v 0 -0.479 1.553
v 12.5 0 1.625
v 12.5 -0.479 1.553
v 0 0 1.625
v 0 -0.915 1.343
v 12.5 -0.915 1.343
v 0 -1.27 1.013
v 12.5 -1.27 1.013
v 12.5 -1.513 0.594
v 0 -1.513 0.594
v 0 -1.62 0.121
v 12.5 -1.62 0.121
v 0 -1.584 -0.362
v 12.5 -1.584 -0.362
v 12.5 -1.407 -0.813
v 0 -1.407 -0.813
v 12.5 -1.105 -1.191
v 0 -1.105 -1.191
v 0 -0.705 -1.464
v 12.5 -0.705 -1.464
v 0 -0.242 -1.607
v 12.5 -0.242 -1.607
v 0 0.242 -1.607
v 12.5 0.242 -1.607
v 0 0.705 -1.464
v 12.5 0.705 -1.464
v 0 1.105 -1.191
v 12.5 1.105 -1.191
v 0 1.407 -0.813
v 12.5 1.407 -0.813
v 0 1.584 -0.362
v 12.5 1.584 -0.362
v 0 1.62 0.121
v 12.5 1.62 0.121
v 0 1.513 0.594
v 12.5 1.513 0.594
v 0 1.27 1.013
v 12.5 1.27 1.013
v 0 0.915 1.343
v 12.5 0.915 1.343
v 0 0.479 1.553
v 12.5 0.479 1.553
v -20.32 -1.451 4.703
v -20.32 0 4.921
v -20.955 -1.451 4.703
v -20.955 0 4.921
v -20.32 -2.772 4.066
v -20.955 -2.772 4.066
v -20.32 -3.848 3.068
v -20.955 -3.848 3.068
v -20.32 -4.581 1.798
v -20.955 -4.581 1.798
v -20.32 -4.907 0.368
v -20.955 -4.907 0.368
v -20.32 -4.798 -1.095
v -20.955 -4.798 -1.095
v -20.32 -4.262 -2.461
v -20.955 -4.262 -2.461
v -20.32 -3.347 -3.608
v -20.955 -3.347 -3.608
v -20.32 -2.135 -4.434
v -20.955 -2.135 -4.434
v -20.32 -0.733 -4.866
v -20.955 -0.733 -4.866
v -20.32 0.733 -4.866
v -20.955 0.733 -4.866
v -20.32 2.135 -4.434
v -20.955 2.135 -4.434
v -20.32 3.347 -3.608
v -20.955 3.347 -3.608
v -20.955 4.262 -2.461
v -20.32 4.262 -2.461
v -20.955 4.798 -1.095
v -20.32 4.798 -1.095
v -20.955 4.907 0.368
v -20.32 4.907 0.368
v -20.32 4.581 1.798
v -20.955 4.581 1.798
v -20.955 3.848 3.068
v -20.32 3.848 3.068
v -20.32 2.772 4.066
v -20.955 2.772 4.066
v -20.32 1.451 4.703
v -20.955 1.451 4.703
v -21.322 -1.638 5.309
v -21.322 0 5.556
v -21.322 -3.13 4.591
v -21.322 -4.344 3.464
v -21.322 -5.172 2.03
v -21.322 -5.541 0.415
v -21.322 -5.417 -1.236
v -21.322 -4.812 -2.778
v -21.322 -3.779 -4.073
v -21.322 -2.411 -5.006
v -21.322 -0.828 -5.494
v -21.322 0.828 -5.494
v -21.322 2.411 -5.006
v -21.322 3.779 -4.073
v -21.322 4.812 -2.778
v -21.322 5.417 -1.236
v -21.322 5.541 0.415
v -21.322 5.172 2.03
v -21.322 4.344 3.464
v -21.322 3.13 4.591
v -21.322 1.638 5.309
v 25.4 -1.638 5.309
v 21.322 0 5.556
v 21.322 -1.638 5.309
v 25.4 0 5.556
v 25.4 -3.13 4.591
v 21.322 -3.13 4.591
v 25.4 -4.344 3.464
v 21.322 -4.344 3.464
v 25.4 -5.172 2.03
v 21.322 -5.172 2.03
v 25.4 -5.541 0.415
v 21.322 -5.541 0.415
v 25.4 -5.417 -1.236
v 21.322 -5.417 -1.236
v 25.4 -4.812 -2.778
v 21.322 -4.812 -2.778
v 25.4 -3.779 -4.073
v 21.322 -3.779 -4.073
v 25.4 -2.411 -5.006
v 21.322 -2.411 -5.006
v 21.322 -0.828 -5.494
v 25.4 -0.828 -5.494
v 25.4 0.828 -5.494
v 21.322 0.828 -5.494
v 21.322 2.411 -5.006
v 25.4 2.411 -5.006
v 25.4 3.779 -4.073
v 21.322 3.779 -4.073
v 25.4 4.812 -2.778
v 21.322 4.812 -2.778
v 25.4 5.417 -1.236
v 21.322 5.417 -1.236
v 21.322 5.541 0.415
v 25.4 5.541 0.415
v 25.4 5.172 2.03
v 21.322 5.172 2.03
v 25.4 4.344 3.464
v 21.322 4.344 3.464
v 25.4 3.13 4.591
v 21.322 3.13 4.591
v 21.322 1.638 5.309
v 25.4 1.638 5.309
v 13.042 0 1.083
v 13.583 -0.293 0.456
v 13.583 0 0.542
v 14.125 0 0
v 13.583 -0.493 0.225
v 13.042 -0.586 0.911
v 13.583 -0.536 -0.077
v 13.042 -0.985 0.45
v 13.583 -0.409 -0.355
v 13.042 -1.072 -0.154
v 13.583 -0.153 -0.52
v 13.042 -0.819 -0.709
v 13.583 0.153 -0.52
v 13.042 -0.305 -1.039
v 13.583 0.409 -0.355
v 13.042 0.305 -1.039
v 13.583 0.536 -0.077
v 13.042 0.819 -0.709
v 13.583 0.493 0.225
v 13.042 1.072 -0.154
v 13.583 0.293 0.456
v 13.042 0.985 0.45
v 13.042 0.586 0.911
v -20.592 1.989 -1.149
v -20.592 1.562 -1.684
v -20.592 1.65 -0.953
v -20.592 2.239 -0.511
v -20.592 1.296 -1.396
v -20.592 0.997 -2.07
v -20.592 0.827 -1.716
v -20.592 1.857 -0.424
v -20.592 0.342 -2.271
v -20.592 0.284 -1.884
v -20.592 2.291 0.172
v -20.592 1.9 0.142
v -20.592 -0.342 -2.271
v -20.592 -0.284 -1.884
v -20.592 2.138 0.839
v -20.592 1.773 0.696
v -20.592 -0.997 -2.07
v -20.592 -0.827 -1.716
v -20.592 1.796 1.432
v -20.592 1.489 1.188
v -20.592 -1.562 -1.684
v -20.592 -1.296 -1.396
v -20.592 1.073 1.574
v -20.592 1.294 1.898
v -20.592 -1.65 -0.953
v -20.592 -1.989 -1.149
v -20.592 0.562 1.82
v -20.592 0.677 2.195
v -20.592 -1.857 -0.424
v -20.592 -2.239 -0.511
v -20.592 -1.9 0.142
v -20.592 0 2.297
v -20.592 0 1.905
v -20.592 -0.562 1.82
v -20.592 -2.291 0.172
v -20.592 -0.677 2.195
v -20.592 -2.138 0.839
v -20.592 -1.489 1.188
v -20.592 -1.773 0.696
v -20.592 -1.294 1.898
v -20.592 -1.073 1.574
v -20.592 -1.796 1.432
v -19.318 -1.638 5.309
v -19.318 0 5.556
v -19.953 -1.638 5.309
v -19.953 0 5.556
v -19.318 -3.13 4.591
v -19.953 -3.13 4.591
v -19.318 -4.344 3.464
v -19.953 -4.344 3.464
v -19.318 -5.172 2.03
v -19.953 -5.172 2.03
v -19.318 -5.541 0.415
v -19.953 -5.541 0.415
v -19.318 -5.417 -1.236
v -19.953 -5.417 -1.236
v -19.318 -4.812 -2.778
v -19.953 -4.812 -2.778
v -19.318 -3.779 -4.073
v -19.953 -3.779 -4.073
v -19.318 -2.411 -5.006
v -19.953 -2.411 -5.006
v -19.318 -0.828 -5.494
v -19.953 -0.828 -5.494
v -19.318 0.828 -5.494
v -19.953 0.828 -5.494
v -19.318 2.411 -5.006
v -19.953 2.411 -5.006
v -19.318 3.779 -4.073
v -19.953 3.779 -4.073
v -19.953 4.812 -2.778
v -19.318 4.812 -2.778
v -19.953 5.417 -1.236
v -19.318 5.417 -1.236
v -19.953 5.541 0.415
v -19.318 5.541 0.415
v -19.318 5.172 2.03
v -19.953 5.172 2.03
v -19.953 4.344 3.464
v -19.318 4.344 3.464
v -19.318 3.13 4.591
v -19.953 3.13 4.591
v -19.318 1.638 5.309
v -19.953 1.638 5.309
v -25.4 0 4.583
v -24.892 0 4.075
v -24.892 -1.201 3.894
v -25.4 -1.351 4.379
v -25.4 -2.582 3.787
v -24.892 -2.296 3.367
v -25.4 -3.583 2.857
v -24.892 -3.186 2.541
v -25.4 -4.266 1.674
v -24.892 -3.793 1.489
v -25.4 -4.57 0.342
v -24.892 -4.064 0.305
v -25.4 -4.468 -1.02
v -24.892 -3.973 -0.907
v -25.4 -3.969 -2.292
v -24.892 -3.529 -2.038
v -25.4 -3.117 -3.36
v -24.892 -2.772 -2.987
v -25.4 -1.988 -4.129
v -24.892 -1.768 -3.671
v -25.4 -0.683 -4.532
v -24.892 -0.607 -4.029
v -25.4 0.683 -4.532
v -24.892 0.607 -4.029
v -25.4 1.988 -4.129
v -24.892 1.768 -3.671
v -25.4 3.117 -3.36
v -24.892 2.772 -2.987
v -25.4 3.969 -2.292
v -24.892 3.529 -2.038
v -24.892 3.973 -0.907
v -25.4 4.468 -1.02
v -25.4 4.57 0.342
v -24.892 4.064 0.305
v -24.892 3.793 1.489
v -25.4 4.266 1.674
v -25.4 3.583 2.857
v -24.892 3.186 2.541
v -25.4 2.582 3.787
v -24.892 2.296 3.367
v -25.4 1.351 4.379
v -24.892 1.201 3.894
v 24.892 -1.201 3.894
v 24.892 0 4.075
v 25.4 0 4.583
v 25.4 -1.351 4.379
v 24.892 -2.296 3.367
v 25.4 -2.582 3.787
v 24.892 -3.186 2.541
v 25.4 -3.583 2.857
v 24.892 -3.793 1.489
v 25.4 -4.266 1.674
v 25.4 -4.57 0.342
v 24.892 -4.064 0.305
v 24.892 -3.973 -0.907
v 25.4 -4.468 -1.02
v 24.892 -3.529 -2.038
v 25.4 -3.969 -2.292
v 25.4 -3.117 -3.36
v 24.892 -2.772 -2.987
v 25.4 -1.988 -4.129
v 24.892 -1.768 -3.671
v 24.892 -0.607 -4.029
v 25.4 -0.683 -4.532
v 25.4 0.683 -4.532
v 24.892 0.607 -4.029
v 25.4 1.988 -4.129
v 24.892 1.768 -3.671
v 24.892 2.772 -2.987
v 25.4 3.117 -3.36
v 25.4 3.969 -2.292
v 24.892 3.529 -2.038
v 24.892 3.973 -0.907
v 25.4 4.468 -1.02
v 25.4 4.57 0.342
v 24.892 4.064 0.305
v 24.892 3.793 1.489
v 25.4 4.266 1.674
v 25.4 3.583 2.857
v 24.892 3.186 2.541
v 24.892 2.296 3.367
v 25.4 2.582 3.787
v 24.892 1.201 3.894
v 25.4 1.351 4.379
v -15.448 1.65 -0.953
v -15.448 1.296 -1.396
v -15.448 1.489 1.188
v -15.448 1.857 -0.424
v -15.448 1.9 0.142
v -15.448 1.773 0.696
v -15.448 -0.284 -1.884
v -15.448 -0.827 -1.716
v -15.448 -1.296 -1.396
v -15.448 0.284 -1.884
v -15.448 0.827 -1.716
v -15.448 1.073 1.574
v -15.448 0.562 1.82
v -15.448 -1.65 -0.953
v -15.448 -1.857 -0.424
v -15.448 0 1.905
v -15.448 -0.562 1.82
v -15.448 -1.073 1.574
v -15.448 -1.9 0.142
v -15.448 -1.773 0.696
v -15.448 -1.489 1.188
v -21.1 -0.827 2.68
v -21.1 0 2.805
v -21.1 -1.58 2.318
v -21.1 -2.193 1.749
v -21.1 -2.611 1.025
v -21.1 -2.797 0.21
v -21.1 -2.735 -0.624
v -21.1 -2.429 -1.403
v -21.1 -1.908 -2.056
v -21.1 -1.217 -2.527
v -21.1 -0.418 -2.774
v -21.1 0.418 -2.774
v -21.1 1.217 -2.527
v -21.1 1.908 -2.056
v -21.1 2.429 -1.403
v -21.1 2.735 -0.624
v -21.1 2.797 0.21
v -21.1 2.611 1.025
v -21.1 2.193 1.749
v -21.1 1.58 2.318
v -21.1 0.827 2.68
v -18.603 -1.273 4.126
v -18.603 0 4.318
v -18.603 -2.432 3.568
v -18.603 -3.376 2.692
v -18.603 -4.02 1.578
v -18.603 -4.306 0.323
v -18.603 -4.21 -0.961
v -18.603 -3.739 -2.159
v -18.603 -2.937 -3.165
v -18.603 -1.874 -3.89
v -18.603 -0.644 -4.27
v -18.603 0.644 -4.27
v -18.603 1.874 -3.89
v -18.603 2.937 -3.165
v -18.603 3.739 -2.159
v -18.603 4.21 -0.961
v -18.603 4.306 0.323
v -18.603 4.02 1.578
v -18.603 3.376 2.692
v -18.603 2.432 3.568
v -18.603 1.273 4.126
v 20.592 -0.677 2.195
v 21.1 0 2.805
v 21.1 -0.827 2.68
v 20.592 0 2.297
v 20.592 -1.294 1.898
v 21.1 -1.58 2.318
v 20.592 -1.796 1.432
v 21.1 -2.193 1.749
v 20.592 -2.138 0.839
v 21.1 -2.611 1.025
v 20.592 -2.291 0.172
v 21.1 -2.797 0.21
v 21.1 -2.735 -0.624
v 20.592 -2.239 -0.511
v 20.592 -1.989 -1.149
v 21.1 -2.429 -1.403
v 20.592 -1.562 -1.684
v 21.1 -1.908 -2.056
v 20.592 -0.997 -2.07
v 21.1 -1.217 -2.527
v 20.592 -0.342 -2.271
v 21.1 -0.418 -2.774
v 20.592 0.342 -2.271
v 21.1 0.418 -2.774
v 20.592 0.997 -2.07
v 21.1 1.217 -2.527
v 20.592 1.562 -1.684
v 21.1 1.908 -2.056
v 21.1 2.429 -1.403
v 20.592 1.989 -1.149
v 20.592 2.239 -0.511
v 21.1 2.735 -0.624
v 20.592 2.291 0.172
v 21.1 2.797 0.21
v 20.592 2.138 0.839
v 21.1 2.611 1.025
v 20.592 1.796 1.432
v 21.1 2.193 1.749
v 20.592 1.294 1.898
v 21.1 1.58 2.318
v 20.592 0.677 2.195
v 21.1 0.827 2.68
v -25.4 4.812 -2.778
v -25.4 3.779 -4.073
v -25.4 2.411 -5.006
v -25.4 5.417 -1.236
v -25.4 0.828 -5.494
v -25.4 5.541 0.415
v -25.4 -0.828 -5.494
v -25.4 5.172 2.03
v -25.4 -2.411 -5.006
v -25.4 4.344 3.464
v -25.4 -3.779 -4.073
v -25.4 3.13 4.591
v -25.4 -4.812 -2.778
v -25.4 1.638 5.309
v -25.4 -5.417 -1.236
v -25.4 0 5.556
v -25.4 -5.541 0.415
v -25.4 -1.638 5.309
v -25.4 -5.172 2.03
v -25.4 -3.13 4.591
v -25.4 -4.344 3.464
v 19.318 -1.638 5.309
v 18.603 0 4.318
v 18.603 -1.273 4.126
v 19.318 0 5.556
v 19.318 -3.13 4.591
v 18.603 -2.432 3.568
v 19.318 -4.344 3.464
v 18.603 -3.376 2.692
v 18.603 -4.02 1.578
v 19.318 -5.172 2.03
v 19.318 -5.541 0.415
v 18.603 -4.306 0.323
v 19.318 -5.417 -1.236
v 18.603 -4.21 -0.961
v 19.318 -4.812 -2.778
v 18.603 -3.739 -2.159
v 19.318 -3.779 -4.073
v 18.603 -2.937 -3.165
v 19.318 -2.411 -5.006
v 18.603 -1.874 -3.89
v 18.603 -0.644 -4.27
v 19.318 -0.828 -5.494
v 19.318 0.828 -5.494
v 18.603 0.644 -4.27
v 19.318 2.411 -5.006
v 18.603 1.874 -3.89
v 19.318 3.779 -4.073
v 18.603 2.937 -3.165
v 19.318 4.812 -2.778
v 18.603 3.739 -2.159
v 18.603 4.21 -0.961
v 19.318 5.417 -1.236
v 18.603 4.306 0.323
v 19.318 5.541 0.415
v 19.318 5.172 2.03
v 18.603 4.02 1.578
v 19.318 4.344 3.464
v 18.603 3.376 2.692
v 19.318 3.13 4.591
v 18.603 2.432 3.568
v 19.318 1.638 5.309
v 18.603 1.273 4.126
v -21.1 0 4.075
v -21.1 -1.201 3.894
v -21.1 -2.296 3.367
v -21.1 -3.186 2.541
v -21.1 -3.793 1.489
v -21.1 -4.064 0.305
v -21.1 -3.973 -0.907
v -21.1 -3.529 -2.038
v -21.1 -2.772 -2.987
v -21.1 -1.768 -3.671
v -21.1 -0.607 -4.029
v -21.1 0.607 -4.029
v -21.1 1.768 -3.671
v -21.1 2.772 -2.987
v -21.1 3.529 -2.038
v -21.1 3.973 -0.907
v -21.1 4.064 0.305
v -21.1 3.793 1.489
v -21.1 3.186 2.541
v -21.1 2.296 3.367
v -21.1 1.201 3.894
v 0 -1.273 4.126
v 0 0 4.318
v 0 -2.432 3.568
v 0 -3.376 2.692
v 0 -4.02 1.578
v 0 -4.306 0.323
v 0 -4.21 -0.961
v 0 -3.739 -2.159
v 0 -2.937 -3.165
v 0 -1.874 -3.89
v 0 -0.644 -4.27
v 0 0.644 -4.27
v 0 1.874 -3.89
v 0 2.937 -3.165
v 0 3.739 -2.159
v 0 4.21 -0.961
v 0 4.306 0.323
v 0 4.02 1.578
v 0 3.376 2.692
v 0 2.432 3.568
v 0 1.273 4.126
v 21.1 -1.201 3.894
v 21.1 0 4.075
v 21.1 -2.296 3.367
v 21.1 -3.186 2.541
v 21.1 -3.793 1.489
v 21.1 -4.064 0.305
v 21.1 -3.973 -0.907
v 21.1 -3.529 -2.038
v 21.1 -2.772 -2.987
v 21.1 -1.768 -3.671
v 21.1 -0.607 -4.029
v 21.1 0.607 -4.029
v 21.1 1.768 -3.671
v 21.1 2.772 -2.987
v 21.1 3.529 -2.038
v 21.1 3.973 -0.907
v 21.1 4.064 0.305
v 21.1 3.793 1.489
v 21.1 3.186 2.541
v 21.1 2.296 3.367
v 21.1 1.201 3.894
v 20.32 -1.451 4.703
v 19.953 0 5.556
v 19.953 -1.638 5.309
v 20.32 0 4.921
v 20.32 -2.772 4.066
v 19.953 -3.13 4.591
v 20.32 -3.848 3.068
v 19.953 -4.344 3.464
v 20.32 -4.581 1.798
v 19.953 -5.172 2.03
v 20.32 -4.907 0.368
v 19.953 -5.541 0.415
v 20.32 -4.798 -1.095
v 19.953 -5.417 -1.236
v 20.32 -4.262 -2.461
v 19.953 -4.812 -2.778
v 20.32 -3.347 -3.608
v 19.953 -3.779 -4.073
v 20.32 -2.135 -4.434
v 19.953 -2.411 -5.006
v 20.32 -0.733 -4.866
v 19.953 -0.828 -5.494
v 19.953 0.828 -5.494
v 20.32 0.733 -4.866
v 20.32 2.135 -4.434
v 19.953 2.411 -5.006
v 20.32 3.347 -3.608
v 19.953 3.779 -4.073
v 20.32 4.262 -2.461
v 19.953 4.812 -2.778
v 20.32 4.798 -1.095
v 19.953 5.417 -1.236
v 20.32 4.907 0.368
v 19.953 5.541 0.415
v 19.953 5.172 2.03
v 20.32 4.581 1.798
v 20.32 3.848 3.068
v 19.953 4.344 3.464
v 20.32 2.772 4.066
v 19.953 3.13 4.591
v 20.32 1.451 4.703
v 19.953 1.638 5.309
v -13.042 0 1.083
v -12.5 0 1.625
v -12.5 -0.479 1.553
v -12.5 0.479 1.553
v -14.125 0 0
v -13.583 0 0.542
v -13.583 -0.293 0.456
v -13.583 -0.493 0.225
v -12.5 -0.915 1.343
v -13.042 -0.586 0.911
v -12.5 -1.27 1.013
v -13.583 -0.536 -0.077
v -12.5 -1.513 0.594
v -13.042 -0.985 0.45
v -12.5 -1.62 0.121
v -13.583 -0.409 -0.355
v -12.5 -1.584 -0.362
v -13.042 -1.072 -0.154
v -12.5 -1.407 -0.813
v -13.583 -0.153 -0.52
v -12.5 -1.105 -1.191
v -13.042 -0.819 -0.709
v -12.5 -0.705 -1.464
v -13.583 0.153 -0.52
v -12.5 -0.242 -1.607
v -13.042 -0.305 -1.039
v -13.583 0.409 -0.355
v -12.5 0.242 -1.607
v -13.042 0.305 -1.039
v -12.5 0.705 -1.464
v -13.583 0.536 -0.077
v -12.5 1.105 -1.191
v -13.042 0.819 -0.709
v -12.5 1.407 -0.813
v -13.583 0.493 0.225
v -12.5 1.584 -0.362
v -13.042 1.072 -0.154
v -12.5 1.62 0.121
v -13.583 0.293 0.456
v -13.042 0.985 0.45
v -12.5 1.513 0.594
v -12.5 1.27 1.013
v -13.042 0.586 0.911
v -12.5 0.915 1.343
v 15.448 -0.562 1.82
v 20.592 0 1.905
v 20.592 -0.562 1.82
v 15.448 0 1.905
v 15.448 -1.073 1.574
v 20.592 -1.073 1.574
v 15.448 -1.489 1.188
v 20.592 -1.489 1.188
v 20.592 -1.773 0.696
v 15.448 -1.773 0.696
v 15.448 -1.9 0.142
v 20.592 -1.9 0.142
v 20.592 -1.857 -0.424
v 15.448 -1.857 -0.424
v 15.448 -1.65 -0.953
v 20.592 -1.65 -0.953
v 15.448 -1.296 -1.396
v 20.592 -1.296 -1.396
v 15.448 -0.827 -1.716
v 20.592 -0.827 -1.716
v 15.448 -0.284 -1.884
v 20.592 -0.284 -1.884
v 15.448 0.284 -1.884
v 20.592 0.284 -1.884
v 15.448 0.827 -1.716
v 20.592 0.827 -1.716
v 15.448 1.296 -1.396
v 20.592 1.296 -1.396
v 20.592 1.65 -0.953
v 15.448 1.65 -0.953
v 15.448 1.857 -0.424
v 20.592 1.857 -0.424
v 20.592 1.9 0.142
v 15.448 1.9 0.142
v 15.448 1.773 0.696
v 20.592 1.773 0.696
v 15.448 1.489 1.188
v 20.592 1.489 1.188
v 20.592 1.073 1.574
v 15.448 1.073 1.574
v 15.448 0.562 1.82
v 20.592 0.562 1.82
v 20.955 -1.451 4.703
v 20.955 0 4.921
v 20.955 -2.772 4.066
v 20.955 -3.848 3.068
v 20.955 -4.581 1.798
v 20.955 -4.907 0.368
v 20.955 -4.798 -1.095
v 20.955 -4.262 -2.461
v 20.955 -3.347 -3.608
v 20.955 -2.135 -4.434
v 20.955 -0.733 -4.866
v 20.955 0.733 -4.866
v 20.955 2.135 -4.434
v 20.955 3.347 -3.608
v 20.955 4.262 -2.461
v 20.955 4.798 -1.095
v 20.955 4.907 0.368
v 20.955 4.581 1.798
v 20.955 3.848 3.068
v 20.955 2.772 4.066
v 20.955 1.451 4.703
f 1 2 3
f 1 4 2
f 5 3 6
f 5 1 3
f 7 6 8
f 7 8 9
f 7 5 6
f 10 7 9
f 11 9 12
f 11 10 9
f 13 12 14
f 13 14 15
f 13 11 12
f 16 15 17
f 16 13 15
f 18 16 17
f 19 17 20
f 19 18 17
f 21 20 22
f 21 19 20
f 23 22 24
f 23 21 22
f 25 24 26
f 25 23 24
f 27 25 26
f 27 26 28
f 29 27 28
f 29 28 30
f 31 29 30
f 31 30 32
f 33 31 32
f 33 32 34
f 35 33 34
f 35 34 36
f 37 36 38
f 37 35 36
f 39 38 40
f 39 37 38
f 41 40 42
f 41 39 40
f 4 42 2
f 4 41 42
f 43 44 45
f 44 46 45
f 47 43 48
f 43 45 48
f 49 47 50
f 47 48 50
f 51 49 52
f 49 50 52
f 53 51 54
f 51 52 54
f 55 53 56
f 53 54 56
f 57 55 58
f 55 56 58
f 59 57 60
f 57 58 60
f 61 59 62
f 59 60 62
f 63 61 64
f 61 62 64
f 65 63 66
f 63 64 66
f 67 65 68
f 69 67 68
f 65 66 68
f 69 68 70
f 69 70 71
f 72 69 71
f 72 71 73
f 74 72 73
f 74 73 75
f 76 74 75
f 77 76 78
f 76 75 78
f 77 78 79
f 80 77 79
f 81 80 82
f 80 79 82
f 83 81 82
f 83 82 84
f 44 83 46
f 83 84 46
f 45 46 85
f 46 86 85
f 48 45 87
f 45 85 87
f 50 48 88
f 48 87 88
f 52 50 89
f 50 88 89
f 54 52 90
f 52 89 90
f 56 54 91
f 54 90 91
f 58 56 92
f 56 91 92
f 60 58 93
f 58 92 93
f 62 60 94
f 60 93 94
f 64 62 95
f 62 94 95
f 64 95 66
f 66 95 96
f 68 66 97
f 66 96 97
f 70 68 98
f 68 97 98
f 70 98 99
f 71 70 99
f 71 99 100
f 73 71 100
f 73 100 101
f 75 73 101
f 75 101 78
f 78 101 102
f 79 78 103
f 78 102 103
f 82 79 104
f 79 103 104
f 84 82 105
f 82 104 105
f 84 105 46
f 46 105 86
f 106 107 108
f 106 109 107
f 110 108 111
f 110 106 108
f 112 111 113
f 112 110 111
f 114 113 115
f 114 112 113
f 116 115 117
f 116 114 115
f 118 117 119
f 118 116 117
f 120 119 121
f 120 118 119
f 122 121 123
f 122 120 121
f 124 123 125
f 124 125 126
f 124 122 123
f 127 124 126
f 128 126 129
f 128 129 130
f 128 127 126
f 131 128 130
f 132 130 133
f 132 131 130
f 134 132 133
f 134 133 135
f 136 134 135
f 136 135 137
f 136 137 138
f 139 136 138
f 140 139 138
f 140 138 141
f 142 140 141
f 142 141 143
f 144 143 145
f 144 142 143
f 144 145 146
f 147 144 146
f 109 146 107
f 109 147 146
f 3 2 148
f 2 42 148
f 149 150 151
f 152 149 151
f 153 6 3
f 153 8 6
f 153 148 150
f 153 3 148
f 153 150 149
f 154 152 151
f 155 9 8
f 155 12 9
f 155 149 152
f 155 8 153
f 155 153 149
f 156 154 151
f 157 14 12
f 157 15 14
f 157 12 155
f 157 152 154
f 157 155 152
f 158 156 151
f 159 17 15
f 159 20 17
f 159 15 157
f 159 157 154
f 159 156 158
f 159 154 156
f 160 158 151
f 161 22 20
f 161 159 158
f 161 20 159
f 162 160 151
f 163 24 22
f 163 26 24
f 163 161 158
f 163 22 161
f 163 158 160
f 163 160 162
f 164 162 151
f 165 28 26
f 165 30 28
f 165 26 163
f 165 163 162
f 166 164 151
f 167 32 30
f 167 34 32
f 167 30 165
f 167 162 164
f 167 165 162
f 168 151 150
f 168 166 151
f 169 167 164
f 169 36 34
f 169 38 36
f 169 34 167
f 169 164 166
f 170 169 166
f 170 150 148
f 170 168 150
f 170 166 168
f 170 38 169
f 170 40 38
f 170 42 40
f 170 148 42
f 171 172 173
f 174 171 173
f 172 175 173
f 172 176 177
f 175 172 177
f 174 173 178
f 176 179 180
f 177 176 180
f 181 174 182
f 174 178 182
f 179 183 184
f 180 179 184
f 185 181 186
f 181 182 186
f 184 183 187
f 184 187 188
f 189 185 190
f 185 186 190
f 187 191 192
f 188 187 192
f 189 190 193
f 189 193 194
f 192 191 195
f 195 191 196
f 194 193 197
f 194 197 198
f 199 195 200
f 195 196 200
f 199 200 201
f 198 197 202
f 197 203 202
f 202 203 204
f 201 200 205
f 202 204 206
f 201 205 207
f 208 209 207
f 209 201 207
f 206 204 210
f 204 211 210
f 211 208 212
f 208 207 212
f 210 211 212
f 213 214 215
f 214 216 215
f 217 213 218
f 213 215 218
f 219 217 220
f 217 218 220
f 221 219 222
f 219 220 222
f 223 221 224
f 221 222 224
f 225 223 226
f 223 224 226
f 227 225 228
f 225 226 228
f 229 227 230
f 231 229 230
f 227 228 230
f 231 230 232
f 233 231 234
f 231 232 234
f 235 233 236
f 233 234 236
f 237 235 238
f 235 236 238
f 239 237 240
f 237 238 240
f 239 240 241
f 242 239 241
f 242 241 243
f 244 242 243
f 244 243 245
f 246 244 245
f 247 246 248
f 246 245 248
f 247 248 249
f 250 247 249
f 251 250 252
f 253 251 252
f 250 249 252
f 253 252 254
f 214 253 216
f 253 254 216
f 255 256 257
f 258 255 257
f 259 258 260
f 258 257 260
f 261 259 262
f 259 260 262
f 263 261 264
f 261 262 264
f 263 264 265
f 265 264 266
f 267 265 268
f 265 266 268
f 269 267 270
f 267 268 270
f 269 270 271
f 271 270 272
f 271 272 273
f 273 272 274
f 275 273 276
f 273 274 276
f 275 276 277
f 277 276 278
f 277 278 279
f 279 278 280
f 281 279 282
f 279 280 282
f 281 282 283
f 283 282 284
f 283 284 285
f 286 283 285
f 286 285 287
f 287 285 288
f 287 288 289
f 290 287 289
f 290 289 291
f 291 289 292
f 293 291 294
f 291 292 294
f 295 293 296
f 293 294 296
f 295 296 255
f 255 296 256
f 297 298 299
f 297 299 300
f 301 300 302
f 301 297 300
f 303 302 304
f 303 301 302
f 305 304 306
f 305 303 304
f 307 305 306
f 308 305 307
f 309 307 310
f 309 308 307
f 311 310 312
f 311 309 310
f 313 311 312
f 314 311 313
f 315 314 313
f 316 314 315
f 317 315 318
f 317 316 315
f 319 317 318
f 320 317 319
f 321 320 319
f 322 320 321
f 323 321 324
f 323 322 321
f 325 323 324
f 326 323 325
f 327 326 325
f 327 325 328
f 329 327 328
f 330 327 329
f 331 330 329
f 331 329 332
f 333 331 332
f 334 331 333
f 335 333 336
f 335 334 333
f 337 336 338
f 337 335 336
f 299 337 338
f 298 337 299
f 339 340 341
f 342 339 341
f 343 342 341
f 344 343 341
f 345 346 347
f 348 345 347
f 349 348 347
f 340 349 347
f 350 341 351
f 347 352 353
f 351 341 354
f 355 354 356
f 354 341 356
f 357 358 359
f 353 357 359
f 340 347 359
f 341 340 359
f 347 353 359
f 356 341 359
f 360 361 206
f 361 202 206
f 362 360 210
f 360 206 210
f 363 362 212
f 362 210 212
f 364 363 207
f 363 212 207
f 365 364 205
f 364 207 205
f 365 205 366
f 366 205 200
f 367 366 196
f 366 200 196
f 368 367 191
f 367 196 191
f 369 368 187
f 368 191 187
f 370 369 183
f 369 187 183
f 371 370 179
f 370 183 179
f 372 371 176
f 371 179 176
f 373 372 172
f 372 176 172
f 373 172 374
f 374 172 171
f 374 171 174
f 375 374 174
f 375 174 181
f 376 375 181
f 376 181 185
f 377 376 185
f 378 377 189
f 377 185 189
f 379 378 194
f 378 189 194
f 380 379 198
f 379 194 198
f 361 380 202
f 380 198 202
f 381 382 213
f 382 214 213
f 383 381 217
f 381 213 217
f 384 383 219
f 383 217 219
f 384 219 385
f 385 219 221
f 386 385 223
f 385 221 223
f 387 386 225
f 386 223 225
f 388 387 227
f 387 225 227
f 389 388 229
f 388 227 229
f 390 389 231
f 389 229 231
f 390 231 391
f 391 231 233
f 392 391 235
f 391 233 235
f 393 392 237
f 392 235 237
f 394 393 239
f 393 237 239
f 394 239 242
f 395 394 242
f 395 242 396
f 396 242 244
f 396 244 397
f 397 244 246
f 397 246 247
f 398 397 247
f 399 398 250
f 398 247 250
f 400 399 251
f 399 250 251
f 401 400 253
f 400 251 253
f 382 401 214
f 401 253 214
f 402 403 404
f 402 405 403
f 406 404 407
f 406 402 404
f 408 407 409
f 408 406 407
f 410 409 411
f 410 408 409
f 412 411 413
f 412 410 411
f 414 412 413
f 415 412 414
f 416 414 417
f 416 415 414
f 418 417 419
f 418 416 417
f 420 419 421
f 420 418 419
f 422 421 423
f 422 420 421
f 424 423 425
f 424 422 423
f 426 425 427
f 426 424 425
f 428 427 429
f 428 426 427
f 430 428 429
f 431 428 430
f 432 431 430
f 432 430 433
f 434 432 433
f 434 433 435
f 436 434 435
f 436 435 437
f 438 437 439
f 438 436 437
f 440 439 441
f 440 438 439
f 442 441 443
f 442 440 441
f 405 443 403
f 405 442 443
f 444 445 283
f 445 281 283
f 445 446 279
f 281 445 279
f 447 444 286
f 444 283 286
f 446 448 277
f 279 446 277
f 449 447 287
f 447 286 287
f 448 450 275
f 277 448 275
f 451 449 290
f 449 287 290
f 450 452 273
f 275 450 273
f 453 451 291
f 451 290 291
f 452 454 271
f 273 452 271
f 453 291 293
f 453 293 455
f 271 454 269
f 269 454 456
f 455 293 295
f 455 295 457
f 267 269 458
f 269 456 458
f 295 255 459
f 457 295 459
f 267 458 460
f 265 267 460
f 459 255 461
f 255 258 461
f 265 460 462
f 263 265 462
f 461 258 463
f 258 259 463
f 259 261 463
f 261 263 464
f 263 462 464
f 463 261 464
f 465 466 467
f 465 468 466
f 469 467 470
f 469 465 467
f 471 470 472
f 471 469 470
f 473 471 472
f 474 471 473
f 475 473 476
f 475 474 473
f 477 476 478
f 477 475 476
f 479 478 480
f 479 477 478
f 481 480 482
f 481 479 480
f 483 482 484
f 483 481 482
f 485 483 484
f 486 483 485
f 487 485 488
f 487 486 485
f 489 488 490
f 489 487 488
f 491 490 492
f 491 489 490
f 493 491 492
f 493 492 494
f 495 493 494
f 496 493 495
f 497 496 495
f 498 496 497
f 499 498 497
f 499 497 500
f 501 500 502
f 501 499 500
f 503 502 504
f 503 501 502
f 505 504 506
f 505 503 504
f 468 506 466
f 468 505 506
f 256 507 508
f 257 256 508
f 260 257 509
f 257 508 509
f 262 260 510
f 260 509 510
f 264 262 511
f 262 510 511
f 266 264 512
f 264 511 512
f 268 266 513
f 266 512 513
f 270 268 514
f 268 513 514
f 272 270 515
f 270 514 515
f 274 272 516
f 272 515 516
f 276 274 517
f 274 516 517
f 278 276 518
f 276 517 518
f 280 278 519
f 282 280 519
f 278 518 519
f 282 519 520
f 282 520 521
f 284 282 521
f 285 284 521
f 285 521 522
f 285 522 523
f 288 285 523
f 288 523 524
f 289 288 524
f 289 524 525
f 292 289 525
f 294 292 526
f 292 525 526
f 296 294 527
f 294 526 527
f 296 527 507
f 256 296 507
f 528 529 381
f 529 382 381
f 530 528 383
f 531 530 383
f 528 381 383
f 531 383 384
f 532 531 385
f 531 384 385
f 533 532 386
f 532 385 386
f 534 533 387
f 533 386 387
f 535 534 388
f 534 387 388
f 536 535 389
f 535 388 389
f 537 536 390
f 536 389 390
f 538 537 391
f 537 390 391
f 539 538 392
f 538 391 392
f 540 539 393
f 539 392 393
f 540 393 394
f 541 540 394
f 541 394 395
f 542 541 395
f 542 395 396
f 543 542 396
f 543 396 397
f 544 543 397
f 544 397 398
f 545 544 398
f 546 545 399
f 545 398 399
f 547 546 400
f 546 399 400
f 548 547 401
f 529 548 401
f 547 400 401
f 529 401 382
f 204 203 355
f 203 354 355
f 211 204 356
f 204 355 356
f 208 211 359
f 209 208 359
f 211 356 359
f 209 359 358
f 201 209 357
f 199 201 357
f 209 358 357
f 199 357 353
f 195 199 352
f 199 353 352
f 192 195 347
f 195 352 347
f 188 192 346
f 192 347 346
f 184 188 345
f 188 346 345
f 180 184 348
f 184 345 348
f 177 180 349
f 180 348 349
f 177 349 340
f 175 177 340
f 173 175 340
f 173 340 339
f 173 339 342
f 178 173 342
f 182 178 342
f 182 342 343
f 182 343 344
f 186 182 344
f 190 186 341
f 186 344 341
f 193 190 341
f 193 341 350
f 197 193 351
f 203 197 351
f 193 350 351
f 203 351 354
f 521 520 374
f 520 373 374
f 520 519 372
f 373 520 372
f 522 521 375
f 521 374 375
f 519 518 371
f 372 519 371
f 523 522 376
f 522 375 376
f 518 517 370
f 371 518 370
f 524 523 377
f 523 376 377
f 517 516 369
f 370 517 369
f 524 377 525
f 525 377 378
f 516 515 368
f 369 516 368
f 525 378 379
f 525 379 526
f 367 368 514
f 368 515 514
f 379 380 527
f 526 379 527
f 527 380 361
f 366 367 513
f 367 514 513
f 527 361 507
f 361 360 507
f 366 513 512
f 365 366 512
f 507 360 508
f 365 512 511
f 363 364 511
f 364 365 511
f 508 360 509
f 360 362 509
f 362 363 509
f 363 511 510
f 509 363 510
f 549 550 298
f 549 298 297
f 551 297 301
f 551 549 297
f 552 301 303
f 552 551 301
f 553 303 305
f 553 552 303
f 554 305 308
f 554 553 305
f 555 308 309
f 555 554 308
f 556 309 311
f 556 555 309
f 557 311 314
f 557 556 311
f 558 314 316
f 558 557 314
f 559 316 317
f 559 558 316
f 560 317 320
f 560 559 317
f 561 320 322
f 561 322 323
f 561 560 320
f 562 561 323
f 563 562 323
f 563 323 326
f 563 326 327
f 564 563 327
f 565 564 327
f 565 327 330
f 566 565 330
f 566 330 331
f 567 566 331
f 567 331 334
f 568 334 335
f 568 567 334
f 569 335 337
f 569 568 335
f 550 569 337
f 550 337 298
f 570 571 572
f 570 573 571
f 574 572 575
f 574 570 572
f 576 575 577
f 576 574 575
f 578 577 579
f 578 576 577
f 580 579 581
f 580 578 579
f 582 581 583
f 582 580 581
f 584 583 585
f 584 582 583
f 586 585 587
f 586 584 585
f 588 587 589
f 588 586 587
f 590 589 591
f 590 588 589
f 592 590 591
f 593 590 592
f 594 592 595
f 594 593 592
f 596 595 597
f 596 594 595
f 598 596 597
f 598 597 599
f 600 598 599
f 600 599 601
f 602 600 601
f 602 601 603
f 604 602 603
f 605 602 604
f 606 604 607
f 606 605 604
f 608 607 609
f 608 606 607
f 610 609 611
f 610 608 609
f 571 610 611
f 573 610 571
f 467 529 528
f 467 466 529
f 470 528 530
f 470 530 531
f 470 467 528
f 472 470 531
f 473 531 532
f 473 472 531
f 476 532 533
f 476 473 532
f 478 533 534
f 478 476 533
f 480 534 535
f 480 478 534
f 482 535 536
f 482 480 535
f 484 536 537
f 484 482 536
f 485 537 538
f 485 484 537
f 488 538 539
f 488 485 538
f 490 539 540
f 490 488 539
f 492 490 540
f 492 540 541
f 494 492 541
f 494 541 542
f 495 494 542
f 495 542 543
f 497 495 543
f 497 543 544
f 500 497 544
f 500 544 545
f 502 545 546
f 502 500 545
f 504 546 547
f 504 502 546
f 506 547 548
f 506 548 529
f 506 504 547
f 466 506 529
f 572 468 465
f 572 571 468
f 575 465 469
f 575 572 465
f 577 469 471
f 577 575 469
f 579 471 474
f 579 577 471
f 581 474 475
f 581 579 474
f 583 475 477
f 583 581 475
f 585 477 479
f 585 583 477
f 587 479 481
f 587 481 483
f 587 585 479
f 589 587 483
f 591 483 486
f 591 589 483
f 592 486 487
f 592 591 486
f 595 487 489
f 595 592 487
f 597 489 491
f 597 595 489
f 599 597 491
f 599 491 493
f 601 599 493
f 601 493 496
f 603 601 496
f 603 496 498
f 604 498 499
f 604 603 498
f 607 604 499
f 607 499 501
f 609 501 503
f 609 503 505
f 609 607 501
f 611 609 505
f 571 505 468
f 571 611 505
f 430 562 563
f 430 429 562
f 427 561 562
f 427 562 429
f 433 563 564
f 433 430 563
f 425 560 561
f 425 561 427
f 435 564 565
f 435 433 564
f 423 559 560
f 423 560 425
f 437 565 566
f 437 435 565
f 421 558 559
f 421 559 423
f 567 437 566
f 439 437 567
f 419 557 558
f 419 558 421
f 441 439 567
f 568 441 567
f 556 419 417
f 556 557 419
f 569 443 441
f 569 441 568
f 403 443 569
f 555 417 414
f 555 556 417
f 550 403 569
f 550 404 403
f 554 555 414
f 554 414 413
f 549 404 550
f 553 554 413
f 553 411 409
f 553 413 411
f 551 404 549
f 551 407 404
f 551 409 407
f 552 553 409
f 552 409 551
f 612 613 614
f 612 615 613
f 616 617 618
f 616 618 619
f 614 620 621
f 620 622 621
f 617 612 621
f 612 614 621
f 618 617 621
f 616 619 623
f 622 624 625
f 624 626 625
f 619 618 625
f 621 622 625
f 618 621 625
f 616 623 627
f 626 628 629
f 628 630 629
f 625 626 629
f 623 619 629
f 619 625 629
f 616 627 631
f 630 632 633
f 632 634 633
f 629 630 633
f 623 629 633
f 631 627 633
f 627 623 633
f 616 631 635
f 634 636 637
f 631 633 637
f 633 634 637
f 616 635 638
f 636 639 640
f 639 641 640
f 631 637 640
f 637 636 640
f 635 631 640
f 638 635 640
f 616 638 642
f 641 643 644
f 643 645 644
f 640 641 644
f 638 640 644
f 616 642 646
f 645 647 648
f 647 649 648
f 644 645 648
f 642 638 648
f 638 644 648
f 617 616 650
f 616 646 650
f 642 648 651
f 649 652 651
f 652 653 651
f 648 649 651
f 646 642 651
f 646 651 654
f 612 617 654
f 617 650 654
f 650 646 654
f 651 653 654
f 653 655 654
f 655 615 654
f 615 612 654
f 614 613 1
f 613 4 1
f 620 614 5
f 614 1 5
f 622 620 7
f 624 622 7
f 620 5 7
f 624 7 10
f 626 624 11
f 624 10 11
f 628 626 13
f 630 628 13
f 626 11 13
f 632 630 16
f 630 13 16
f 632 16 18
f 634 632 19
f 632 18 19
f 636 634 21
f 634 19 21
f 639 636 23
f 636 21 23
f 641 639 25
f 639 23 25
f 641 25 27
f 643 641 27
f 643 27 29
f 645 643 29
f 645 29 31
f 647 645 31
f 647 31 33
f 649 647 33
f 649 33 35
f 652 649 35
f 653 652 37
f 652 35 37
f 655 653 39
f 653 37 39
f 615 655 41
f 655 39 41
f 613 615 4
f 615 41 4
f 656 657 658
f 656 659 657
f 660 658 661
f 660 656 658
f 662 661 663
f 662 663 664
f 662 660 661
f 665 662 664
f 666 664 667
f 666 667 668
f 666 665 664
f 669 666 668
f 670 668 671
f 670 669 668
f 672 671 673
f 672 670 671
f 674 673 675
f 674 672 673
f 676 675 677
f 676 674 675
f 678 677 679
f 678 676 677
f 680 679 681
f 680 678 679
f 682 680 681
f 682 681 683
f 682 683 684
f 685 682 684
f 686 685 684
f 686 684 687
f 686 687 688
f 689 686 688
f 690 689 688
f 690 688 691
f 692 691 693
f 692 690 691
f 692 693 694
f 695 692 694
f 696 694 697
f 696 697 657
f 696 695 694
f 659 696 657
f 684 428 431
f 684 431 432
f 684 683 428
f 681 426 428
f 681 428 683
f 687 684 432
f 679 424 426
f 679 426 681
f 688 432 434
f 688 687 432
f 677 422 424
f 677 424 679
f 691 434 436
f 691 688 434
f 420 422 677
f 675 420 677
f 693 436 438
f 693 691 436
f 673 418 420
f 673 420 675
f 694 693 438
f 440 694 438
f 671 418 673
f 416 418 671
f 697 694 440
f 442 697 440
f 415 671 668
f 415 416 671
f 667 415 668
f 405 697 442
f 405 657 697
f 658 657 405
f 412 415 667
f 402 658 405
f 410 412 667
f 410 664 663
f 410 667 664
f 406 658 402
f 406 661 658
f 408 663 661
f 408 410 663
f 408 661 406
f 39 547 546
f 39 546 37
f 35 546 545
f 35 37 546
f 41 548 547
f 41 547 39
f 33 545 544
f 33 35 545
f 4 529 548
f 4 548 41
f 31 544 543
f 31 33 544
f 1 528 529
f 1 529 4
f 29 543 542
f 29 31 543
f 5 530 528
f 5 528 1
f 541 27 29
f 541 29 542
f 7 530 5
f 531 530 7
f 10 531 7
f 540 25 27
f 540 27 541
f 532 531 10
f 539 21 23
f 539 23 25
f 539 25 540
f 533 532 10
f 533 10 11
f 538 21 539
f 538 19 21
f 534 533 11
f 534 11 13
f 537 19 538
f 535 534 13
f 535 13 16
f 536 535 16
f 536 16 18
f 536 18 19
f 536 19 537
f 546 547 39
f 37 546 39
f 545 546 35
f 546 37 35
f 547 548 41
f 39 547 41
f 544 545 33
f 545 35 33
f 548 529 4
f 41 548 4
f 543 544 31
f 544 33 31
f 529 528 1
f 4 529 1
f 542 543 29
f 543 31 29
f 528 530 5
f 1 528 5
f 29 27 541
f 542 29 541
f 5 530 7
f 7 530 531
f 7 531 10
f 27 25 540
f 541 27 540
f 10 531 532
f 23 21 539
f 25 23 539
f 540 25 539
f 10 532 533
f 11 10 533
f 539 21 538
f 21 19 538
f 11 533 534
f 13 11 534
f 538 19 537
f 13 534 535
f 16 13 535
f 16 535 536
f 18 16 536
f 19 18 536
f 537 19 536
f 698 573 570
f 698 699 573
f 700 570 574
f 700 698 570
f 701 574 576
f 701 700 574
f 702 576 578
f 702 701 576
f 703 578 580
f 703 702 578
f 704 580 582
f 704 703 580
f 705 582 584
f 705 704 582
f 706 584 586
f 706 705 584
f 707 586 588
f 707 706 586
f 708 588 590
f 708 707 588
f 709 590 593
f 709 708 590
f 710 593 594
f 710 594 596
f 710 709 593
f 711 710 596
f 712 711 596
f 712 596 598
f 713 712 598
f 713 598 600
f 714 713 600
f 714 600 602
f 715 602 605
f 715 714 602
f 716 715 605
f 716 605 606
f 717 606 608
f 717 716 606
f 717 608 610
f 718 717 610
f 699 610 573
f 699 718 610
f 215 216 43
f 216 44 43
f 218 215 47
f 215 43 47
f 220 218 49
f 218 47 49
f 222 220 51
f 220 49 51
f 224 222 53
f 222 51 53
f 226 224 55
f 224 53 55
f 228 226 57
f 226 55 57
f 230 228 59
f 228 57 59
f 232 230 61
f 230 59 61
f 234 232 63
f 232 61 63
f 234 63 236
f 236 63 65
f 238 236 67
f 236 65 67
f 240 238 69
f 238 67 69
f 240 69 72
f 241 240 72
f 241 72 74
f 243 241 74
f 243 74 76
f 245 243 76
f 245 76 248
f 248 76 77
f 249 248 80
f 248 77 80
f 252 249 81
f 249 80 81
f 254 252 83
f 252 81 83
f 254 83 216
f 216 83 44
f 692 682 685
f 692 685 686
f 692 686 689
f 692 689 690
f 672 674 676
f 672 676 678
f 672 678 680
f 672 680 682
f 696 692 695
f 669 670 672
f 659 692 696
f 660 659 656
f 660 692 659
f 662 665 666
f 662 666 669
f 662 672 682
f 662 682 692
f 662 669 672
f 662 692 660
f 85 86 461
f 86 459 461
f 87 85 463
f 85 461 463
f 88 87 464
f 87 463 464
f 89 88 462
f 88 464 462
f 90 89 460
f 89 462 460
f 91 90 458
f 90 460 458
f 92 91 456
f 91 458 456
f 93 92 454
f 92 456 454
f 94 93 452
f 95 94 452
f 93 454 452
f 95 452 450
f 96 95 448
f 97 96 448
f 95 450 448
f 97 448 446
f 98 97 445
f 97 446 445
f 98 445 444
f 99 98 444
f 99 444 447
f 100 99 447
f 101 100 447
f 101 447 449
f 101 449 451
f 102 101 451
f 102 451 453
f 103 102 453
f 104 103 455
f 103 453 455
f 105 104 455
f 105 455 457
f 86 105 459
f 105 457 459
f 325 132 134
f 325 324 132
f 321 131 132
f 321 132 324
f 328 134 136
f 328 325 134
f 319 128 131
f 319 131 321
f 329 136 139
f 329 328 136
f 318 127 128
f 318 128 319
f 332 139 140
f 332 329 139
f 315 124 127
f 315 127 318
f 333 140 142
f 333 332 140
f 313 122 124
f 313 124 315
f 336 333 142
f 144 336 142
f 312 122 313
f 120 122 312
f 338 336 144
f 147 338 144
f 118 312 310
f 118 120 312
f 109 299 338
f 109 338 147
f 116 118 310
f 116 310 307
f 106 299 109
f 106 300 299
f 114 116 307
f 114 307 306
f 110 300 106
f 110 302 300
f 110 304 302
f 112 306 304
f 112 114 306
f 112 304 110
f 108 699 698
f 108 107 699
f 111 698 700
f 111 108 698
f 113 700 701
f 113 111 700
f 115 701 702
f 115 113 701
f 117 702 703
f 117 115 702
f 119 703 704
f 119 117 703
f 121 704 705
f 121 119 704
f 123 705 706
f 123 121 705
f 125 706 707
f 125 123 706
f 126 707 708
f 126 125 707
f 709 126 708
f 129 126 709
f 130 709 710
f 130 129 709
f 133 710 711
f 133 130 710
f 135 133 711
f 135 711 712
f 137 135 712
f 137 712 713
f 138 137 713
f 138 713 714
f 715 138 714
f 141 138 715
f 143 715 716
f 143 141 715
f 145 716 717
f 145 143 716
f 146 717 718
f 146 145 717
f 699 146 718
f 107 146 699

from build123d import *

# Parameters (mm, degrees)
CHAMFER1_SIZE = 0.508


with BuildPart() as part:
    # Sketch2 → Revolve1 (revolve)
    with BuildSketch(Plane.XY, mode=Mode.PRIVATE) as revolve1_sk:
        Polygon((-21.321617421, 5.55625), (-25.4, 5.55625), (-25.4, 4.075), (-21.099999964, 4.075), (-21.099999964, 2.805), (-20.591999964, 2.297), (-20.591999964, 1.905), (-15.448, 1.905), (-15.448, 0), (-14.125000052, 0), (-12.5, 1.625000052), (0, 1.625000052), (0, 4.318), (-18.603478608, 4.318), (-19.318382579, 5.55625), (-19.953382579, 5.55625), (-20.32, 4.92125), (-20.955, 4.92125), align=None)
    revolve(revolve1_sk.sketch.rotate(Axis((-25.4, 0, 0), (1, 0, 0)), 90), axis=Axis((-25.4, 0, 0), (1, 0, 0)))

    # Chamfer1
    chamfer1_edges = [part.edges().sort_by_distance(p)[0] for p in [
        (-25.4, 0, -4.075),
    ]]
    chamfer(chamfer1_edges, length=CHAMFER1_SIZE)


with BuildPart() as body_2:
    # Mirror1: mirrored copy
    add(part.part.mirror(Plane(origin=(0, 0, 0), x_dir=(0, 0, 1), z_dir=(1, 0, 0))))


solid = Compound([part.part, body_2.part])
